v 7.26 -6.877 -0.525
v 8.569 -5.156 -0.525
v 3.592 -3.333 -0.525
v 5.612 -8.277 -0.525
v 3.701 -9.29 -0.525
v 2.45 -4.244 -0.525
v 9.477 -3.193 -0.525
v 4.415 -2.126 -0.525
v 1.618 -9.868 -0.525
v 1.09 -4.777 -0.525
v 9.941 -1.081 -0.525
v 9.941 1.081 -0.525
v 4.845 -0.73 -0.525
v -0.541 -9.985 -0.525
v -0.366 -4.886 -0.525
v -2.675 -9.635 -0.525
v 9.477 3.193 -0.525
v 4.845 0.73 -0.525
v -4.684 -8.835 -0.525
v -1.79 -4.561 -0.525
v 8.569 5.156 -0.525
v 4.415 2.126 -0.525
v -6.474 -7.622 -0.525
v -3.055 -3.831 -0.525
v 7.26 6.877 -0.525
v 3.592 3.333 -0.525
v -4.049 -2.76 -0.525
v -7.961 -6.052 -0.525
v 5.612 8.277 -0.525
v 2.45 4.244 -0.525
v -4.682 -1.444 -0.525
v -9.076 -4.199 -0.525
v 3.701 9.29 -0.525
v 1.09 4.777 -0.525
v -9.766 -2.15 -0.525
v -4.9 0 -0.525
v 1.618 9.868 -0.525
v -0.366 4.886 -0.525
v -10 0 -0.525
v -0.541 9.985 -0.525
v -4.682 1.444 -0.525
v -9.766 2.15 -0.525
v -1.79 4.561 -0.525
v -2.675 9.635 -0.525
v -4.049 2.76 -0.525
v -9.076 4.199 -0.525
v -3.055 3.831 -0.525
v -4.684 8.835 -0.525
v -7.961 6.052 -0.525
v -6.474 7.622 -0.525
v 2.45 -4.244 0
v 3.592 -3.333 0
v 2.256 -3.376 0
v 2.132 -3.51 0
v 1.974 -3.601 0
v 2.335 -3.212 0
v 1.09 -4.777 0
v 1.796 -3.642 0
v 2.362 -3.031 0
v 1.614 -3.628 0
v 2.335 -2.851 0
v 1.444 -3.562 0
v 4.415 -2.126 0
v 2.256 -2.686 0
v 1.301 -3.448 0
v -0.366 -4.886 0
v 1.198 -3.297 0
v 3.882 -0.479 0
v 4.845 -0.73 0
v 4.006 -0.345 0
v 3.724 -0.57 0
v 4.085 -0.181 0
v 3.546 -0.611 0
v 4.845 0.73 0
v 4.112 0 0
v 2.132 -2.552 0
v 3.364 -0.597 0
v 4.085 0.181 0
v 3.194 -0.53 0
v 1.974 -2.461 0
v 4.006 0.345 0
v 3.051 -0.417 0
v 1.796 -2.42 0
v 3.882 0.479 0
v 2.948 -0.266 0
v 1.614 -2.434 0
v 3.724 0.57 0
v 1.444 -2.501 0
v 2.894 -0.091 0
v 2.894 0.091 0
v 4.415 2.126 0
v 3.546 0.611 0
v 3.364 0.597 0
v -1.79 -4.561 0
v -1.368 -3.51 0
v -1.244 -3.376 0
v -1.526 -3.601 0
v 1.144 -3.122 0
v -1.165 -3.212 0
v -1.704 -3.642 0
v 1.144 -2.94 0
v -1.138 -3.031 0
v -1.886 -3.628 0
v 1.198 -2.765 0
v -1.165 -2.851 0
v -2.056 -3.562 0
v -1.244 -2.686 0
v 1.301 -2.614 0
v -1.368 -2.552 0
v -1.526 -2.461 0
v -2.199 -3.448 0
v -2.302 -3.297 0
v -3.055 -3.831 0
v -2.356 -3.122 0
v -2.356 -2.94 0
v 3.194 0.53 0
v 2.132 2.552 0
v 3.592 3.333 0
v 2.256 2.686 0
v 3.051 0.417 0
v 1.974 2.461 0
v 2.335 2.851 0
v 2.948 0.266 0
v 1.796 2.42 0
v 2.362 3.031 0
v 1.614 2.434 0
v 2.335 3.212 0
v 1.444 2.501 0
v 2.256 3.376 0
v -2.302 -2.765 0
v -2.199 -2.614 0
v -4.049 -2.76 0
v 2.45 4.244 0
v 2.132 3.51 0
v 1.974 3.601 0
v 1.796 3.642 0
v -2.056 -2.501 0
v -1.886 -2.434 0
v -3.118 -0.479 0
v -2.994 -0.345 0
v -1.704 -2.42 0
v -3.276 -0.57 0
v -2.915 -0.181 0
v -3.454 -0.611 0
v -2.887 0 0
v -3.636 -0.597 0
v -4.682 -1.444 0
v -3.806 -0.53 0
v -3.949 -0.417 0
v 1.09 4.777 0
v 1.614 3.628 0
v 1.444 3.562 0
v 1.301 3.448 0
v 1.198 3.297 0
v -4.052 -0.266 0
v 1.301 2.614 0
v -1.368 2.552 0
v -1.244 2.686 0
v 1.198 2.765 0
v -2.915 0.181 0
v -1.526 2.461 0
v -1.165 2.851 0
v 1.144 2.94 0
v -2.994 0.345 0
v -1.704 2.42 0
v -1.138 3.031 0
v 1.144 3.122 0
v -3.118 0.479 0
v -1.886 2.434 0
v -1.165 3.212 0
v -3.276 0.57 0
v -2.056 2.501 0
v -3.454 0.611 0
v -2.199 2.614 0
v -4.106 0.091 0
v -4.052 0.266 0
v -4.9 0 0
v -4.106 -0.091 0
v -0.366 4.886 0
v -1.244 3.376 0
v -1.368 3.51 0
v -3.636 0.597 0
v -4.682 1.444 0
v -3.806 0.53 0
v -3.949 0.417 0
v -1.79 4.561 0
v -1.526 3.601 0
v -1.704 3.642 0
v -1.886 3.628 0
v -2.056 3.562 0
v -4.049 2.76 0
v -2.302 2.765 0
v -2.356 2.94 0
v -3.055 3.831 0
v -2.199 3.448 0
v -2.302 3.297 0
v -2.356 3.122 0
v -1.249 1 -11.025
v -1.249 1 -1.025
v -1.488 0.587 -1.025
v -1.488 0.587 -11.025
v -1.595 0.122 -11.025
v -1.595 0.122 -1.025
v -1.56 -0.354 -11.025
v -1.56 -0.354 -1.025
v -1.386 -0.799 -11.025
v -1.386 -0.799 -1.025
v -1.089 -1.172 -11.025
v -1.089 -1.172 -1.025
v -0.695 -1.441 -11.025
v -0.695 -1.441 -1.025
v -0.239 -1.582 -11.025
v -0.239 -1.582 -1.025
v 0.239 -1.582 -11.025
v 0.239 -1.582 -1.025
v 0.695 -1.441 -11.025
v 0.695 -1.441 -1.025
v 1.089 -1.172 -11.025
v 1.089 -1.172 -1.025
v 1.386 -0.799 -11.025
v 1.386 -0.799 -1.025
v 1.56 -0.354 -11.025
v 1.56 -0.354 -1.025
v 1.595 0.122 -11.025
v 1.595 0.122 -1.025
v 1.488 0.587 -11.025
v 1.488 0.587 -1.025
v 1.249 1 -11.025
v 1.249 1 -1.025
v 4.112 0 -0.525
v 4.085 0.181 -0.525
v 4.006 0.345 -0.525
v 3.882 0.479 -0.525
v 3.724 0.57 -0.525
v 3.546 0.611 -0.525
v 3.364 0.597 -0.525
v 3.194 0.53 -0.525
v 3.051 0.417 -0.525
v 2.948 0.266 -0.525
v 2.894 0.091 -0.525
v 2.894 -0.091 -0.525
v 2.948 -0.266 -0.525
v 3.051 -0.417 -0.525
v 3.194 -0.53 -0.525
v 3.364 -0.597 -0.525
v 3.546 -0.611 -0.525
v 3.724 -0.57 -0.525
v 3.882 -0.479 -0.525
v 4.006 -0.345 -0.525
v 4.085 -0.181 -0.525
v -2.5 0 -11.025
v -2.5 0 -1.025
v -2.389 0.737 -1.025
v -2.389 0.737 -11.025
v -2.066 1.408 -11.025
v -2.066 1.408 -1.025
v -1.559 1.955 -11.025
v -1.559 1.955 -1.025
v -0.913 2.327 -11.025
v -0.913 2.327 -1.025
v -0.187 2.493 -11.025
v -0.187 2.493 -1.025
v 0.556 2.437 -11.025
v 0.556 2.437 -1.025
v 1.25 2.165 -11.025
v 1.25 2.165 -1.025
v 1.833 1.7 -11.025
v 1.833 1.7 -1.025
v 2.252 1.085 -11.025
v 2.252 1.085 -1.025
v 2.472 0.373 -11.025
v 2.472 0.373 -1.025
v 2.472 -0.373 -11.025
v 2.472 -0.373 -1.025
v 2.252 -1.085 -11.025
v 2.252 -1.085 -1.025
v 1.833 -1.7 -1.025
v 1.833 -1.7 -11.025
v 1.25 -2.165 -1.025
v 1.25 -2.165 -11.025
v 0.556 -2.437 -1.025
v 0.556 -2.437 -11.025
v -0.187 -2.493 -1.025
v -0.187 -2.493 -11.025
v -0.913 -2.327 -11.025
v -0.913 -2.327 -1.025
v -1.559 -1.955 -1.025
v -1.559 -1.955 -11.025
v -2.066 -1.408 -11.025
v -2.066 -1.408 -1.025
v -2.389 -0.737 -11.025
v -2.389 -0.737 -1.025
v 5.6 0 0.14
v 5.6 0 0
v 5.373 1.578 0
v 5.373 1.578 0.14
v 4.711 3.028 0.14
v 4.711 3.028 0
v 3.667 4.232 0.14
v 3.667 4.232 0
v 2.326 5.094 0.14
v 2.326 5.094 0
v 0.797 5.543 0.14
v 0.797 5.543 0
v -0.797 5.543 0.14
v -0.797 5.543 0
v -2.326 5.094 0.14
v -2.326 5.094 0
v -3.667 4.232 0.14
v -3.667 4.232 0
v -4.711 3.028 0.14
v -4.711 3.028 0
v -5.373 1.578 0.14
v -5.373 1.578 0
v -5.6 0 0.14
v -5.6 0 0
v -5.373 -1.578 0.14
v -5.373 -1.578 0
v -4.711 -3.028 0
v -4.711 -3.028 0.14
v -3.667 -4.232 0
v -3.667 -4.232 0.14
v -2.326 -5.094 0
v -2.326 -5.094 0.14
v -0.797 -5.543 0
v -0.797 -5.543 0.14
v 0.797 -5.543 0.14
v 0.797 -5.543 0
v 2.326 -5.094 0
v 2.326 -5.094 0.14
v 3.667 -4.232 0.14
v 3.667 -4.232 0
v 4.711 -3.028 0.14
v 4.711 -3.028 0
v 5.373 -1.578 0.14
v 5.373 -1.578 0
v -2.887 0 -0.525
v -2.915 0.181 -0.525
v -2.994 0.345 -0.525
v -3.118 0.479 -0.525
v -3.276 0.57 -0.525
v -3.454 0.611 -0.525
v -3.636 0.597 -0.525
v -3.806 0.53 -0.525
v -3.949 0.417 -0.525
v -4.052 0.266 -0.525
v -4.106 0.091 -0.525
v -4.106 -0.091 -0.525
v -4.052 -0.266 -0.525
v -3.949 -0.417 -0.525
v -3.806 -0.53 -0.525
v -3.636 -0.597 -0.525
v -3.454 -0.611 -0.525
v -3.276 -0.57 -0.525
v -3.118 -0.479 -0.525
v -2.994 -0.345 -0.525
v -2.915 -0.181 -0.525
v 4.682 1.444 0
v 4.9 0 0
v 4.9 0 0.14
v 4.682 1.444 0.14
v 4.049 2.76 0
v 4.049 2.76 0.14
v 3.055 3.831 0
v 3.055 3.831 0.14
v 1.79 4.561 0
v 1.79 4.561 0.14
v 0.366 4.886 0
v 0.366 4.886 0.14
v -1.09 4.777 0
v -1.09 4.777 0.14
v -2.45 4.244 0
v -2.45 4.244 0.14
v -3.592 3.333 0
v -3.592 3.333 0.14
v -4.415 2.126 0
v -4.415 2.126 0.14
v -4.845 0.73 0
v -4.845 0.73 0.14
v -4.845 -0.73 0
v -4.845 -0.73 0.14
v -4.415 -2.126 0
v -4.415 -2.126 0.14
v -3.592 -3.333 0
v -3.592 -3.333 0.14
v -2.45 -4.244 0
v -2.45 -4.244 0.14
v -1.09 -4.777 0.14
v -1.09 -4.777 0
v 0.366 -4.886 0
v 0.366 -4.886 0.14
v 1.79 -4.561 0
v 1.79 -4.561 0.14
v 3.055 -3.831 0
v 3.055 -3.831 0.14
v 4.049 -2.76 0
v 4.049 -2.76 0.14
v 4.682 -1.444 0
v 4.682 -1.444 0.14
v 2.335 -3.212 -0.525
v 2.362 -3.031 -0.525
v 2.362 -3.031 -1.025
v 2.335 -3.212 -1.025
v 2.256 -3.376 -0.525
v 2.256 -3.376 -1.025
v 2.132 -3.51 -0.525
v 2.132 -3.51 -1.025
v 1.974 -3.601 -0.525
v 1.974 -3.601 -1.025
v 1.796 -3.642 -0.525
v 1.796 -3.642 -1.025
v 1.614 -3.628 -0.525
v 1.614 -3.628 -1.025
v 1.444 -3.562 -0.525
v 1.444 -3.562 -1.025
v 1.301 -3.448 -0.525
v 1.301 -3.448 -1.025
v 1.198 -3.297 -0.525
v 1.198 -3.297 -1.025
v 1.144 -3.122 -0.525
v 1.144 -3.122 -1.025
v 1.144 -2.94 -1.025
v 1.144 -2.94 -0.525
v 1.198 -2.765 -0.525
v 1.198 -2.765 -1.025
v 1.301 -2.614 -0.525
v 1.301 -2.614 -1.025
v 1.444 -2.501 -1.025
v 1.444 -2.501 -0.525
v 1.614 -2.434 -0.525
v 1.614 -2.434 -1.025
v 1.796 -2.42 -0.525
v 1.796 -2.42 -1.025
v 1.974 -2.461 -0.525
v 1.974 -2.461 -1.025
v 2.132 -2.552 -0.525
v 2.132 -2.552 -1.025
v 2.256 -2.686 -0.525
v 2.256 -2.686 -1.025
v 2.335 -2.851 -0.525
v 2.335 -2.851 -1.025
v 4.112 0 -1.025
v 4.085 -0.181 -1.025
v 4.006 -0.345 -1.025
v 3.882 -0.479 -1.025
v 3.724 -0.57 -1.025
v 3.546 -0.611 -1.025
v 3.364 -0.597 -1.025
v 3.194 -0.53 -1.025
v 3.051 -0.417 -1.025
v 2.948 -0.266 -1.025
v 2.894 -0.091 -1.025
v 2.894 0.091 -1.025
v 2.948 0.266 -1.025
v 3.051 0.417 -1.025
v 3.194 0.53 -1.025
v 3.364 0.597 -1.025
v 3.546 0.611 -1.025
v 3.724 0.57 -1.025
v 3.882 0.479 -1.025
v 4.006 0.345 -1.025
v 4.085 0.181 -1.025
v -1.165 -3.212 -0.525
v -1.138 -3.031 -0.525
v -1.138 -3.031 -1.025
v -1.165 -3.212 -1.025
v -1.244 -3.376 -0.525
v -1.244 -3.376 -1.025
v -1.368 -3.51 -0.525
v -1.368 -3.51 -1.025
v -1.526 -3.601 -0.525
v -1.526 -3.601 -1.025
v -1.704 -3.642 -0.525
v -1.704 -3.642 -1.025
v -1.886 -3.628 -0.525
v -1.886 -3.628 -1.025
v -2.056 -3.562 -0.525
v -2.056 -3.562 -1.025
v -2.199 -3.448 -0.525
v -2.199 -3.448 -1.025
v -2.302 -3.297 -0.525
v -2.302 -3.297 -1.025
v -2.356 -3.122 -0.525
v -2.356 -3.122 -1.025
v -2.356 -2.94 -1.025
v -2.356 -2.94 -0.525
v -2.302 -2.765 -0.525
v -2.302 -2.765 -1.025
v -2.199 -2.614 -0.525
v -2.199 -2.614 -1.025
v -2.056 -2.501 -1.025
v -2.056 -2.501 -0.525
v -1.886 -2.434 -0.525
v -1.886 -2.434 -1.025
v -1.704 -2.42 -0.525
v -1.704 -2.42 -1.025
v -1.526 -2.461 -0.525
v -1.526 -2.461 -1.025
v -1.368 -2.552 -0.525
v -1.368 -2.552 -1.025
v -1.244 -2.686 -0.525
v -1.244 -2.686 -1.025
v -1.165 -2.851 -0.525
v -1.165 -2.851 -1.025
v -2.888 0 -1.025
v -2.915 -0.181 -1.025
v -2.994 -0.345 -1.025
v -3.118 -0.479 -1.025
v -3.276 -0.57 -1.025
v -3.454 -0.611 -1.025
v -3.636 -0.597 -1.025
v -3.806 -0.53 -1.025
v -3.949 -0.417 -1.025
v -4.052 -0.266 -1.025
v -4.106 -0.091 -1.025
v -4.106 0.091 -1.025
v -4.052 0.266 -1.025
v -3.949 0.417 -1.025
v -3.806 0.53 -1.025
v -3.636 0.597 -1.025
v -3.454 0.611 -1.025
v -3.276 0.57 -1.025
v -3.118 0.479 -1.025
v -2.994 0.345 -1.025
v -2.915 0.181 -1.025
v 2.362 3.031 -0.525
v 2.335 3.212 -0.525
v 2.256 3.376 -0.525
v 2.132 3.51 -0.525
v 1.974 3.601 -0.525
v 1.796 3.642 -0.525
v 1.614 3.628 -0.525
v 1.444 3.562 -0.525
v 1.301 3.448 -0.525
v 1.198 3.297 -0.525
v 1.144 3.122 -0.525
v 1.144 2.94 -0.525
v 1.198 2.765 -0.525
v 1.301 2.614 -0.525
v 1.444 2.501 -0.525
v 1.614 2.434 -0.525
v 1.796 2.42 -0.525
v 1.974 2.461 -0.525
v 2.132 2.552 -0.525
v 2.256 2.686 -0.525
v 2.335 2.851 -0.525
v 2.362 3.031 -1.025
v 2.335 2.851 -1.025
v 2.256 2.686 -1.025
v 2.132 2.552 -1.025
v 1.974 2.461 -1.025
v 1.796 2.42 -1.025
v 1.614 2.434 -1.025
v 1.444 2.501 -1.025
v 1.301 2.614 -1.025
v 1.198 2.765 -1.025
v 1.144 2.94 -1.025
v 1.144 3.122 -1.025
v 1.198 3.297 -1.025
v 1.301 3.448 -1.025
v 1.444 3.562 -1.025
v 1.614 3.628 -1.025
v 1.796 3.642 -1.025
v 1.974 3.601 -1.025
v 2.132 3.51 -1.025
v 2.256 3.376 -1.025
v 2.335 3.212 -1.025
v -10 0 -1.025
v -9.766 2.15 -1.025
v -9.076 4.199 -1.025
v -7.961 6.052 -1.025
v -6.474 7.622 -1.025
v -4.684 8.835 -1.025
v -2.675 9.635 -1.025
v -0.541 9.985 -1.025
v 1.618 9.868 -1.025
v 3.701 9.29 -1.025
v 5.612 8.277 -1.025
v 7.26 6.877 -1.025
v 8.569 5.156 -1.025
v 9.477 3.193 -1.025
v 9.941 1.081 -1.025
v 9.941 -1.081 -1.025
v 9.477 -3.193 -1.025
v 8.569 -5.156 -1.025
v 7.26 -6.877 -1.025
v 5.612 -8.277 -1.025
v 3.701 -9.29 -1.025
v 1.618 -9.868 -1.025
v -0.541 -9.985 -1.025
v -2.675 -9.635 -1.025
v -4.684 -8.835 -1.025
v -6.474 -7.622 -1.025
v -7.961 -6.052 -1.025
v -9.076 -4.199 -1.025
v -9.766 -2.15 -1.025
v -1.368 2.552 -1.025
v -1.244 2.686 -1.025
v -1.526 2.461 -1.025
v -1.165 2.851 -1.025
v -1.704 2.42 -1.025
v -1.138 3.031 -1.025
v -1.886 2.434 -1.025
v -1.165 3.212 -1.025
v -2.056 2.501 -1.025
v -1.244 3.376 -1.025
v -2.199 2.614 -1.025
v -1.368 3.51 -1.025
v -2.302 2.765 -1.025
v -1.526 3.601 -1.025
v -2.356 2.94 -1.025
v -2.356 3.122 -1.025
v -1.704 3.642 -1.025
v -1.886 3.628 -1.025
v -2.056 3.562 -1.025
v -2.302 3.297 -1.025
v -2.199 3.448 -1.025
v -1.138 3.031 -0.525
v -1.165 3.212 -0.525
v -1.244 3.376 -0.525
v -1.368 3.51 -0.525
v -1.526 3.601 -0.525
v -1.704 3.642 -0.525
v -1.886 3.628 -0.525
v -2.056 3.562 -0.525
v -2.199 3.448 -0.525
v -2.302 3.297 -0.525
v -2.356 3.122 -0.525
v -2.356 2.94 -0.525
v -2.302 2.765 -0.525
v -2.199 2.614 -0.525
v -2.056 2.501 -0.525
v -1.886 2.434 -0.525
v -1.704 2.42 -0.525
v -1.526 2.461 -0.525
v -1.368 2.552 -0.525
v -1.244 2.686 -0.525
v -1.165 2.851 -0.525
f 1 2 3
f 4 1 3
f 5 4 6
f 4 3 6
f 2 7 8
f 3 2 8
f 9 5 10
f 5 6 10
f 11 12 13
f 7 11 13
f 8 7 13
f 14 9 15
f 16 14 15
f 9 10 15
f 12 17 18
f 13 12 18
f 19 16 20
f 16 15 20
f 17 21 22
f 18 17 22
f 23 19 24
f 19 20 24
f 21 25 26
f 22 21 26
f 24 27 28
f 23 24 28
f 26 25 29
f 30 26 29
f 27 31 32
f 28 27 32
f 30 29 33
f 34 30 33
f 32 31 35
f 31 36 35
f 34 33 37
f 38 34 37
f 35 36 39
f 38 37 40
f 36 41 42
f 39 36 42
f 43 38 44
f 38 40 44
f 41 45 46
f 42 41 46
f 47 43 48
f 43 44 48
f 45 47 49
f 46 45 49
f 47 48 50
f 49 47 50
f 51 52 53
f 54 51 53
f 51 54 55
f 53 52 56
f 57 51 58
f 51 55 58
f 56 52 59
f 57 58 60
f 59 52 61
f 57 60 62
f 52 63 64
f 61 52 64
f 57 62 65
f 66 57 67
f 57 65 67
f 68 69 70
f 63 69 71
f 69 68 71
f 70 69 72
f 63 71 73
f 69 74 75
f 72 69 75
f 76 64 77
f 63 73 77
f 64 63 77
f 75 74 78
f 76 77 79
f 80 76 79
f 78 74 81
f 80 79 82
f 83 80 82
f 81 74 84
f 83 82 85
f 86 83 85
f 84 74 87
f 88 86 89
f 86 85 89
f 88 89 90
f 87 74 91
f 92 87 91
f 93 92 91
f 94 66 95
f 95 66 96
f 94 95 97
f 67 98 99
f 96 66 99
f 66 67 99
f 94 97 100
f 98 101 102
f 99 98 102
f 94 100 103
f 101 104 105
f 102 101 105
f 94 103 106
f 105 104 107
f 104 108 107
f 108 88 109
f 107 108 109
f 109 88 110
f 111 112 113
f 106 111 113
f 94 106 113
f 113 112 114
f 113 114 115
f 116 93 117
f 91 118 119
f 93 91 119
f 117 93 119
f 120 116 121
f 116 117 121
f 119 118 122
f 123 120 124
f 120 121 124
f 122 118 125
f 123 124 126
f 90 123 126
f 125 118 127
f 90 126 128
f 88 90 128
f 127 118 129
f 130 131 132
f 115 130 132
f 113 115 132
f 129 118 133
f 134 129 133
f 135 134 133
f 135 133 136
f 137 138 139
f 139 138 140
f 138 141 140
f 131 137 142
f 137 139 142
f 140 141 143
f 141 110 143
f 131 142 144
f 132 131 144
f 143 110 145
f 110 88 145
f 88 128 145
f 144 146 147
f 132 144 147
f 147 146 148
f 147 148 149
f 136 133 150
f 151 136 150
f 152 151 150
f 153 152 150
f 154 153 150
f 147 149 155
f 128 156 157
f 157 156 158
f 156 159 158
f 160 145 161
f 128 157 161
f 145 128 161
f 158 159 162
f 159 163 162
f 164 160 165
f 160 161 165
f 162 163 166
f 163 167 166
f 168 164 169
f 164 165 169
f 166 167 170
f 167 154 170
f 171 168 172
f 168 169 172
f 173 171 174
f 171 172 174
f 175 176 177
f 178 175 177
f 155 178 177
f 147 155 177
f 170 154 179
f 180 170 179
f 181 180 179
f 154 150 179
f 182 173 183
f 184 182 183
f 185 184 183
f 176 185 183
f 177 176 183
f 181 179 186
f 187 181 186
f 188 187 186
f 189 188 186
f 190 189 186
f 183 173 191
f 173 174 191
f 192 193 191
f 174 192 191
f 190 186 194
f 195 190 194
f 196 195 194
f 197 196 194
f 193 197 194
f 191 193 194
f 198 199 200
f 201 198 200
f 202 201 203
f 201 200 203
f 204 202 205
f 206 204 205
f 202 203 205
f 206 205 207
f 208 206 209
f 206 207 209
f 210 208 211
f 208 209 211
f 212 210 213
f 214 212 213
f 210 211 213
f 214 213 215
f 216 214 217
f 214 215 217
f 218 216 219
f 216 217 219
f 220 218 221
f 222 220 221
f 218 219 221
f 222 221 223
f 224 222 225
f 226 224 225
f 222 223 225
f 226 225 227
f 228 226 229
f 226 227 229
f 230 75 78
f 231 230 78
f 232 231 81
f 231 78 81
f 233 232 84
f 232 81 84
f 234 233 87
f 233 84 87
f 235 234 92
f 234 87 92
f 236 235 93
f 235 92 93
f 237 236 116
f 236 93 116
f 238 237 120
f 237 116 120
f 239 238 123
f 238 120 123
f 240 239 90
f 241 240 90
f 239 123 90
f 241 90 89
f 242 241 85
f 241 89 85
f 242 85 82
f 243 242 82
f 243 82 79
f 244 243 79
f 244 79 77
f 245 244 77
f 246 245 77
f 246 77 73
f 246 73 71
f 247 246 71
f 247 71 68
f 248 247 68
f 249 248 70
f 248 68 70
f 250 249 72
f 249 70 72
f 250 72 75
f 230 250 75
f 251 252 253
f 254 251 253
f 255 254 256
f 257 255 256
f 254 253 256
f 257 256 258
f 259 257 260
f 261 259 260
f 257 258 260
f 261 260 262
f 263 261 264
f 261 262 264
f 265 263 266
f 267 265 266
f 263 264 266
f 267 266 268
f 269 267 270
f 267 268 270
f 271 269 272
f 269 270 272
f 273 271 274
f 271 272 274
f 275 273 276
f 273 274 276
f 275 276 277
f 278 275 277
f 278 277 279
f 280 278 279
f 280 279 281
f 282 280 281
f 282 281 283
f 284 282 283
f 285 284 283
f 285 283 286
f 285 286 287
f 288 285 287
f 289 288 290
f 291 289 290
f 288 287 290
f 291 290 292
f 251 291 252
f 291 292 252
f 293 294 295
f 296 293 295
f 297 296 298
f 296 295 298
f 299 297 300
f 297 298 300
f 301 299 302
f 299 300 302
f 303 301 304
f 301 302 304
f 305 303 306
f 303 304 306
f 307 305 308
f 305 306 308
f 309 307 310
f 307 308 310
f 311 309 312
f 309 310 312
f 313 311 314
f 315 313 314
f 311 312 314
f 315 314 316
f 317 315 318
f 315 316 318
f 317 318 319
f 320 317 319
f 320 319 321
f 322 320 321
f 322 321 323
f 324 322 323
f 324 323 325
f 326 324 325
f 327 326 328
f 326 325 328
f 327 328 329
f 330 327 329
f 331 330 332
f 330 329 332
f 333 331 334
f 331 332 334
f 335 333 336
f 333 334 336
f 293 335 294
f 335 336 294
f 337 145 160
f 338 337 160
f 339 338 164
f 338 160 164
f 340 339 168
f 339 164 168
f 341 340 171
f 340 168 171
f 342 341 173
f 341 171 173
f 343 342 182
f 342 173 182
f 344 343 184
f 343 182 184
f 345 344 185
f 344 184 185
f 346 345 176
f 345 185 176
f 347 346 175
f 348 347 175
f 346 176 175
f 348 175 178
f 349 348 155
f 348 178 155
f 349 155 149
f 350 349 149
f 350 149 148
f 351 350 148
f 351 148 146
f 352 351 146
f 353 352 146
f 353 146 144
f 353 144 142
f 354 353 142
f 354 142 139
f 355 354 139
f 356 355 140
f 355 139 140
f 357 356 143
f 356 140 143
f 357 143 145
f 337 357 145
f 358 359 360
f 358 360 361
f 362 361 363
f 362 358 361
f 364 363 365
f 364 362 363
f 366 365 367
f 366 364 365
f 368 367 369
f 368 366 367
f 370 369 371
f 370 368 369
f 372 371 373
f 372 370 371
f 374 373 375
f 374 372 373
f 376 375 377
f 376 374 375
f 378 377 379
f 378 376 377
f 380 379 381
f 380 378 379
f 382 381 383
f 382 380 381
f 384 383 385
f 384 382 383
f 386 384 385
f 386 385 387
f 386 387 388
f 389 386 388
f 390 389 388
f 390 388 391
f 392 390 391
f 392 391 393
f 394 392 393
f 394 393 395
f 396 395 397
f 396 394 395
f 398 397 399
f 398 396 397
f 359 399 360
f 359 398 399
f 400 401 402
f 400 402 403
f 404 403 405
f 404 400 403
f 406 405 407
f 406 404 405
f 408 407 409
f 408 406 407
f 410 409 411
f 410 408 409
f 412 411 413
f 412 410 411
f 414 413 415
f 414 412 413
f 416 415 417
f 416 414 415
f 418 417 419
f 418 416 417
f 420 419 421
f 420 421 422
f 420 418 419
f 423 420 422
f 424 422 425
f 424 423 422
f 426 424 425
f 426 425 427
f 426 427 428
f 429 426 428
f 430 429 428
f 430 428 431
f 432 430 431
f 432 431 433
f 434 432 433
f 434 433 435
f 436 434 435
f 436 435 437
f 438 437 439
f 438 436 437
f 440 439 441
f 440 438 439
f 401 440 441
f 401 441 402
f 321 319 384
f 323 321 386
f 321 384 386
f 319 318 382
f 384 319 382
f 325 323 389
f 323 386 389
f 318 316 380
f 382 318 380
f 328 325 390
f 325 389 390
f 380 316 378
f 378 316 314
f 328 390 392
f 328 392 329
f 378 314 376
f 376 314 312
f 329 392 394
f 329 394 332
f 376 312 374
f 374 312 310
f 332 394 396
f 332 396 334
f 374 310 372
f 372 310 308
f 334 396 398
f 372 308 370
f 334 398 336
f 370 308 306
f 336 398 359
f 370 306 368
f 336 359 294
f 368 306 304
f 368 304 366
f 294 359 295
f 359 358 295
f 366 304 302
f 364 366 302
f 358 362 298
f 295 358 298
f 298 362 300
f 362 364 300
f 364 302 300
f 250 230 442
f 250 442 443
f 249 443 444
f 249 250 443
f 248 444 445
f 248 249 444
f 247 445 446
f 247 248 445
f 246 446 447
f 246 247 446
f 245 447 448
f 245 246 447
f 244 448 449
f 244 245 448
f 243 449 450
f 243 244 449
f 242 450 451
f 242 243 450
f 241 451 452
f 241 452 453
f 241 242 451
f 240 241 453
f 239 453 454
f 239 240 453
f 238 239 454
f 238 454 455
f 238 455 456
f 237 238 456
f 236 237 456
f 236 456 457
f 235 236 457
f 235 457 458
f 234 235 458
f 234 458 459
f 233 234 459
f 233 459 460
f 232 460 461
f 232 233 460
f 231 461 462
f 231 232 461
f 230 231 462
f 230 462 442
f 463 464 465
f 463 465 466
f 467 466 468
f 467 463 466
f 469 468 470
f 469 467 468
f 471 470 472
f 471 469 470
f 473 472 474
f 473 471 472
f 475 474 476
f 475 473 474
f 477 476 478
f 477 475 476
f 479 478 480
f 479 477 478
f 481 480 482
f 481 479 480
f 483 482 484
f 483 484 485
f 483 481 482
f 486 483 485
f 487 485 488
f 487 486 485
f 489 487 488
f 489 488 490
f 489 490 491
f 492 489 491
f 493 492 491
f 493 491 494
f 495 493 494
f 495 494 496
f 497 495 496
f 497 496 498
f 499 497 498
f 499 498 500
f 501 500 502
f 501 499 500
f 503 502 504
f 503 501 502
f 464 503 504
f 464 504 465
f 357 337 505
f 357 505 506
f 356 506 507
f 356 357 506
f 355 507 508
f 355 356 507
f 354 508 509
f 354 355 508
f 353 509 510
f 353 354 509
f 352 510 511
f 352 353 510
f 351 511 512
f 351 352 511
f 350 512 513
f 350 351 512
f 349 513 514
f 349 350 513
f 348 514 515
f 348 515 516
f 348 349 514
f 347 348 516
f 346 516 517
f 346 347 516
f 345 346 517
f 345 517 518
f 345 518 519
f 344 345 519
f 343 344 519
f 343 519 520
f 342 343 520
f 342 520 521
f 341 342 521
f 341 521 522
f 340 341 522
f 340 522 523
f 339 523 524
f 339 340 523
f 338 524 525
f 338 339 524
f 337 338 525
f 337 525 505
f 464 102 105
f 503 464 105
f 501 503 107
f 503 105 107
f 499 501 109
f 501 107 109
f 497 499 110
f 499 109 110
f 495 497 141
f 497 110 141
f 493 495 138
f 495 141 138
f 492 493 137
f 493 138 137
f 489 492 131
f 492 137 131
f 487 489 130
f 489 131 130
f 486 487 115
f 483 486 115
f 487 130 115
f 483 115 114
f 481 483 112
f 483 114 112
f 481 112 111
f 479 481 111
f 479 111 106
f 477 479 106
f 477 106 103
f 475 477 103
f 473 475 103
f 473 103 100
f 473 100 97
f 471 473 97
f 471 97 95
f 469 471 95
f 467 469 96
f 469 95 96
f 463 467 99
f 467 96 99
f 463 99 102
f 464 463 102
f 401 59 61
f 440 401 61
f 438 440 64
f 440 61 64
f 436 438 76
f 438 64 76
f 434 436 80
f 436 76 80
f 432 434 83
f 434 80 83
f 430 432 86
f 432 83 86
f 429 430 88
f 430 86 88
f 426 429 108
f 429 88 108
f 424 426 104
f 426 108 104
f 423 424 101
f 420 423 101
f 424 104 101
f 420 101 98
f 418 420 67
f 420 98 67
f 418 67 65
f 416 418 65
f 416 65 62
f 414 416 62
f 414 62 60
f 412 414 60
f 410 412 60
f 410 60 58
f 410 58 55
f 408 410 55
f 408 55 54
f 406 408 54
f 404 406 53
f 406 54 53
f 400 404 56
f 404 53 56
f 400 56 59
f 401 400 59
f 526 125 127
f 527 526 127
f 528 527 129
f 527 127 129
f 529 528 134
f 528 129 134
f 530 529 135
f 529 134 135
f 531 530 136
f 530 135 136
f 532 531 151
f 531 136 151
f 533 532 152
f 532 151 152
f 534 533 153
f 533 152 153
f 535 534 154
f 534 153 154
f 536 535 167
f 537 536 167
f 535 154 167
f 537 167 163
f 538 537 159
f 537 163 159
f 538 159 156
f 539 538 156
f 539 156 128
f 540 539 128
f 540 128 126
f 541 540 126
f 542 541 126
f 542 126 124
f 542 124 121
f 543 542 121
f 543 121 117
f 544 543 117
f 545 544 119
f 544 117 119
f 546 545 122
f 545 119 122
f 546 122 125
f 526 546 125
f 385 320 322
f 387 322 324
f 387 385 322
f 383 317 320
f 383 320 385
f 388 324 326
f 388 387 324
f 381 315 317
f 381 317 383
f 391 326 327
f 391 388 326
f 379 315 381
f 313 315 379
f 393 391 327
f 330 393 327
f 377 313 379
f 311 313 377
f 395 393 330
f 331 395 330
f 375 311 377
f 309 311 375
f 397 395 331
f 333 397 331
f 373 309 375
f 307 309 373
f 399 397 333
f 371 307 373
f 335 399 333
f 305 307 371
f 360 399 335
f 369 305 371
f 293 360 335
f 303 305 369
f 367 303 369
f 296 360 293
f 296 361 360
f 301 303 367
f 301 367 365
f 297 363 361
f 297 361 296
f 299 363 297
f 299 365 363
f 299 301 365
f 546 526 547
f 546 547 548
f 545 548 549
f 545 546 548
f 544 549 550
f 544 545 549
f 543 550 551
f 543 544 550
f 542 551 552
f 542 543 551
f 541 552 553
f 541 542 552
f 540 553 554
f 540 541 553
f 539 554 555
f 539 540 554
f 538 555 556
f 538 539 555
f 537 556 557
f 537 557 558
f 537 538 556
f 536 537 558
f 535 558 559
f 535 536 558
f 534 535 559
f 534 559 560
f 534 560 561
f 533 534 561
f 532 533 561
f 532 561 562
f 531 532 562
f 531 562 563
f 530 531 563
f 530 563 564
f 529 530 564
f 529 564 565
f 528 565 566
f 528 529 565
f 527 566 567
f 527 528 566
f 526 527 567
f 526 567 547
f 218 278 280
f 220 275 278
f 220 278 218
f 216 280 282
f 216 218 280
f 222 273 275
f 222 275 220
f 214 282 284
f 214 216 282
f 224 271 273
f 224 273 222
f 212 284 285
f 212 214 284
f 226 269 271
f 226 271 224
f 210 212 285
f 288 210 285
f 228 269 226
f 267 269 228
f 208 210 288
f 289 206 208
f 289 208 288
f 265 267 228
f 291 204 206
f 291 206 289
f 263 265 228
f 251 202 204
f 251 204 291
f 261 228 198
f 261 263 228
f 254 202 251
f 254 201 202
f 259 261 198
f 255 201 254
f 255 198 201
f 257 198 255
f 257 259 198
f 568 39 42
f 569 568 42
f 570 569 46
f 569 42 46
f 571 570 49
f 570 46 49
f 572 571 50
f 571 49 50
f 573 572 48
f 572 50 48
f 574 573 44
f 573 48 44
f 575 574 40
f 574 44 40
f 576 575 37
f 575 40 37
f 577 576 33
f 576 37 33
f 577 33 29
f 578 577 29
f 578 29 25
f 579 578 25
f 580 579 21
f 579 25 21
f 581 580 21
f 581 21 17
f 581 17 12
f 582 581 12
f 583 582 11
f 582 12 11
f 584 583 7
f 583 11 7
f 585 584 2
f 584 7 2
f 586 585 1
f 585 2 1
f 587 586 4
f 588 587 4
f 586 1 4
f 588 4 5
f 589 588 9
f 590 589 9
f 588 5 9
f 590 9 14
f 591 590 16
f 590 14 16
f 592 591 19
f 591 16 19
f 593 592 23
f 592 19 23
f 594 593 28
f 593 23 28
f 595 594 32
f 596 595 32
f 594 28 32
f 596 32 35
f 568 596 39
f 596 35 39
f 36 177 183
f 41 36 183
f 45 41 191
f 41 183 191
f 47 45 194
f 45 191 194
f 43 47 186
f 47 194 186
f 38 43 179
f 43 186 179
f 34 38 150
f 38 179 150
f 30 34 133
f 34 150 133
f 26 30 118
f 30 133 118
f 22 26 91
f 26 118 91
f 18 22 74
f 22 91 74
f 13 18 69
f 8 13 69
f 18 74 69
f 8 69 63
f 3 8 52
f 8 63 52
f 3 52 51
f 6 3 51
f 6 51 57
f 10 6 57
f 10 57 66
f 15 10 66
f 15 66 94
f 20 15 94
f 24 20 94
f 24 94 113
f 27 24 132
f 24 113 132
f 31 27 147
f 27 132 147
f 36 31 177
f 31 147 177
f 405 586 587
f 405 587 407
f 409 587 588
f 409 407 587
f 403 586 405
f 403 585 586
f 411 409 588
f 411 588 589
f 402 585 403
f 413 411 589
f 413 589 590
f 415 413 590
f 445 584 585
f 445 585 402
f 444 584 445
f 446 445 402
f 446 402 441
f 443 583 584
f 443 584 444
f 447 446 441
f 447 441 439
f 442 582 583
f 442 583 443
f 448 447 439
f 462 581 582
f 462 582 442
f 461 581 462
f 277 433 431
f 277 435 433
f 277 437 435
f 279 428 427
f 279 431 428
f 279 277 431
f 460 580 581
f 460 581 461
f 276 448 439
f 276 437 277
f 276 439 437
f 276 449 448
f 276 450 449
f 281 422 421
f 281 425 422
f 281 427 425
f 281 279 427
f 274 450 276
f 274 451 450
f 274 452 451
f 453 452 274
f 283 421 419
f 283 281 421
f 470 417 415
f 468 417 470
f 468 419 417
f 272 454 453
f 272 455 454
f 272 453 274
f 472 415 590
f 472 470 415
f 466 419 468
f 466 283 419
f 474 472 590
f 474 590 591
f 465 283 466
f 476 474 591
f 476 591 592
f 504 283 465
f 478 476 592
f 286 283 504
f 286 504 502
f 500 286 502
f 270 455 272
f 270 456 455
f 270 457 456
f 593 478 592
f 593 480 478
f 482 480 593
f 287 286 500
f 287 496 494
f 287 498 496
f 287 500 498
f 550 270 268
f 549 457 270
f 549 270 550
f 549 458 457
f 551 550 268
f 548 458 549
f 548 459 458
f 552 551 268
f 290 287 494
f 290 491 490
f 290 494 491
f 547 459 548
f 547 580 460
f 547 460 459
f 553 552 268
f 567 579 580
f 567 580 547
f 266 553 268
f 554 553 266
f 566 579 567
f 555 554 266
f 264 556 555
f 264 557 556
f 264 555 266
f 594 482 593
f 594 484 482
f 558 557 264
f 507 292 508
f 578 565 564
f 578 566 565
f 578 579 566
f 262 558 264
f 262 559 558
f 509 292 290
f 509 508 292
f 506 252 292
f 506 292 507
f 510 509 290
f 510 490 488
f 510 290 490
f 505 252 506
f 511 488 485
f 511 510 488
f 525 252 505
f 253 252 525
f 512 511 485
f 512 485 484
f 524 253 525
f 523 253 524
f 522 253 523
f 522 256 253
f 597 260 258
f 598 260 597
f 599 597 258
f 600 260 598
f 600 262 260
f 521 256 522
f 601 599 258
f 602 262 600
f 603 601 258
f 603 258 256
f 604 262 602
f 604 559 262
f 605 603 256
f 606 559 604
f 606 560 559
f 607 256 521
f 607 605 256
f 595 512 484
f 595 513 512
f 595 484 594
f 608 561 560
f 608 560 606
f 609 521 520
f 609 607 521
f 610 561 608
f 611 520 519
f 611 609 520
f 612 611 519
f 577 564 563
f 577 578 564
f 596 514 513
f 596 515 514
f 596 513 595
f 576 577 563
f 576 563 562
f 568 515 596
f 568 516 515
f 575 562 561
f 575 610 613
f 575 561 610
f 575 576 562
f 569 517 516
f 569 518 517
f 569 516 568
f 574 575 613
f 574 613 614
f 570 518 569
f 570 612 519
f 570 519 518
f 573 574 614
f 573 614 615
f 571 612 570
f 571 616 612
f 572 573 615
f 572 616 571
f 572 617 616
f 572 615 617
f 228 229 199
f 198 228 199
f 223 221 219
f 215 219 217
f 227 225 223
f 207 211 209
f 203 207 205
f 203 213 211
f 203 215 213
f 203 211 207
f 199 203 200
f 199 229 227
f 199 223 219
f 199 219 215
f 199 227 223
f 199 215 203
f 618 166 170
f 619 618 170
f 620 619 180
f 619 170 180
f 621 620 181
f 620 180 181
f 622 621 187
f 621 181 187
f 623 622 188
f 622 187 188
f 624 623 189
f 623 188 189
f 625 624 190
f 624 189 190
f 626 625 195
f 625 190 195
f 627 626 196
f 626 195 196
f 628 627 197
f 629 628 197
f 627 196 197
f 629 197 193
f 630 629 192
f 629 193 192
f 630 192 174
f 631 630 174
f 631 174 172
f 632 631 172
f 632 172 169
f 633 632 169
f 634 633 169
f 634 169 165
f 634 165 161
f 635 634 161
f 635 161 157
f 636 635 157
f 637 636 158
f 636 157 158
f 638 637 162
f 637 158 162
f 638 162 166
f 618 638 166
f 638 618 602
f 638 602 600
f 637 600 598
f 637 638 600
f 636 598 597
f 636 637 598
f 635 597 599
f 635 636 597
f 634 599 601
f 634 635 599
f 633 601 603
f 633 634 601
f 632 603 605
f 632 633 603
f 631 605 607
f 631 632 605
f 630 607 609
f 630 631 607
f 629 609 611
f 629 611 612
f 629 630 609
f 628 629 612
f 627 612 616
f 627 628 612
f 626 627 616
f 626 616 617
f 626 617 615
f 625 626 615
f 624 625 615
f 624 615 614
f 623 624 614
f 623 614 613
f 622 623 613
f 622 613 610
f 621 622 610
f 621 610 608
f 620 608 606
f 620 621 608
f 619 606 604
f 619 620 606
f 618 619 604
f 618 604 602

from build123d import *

# Parameters (mm, degrees)
SKETCH_1_R          = 16
SKETCH_1_R_2        = 14
EXTRUDE_1_DEPTH     = 0.4
SKETCH_2_R          = 14
EXTRUDE_1_2_DEPTH   = 1.5
SKETCH_3_R          = 1.75
CUT_EXTRUDE_1_DEPTH = 1.5
SCALE_1_SCALE       = 0.35
SKETCH_4_R          = 10
SKETCH_4_R_2        = 0.6125
EXTRUDE_2_DEPTH     = 0.5
SKETCH_5_R          = 2.5
EXTRUDE_3_DEPTH     = 10


with BuildPart() as part:
    # 草图1 → Extrude 1 (new body)
    with BuildSketch(Plane.XY):
        Circle(SKETCH_1_R)
        Circle(SKETCH_1_R_2, mode=Mode.SUBTRACT)
    extrude(amount=EXTRUDE_1_DEPTH)


with BuildPart() as body_2:
    # 草图2 → Extrude 1 2 (new body)
    with BuildSketch(Plane(origin=(0, 0, 0), x_dir=(-1, 0, 0), z_dir=(0, 0, -1))):
        Circle(SKETCH_2_R)
    extrude(amount=EXTRUDE_1_2_DEPTH)

    # 草图3 → 切除-拉伸1 (cut)
    with BuildSketch(Plane.XY):
        with Locations((10, 0)):
            Circle(SKETCH_3_R)
        with Locations((5, -8.660254038)):
            Circle(SKETCH_3_R)
        with Locations((-5, -8.660254038)):
            Circle(SKETCH_3_R)
        with Locations((-10, 0)):
            Circle(SKETCH_3_R)
        with Locations((-5, 8.660254038)):
            Circle(SKETCH_3_R)
        with Locations((5, 8.660254038)):
            Circle(SKETCH_3_R)
    extrude(amount=-CUT_EXTRUDE_1_DEPTH, mode=Mode.SUBTRACT)


with BuildPart() as part_1:
    # 缩放比例1: scaled about (0, 0, 0)
    add(part.part.scale(SCALE_1_SCALE))


with BuildPart() as body_2_1:
    # 缩放比例1: scaled about (0, 0, 0)
    add(body_2.part.scale(SCALE_1_SCALE))

    # 草图4 → 凸台-拉伸2 (add)
    with BuildSketch(Plane(origin=(0, 0, -0.525), x_dir=(-1, 0, 0), z_dir=(0, 0, -1))):
        Circle(SKETCH_4_R)
        with Locations(Location((1.75, -3.031088913, 0), (0, 0, 180))):
            Circle(SKETCH_4_R_2, mode=Mode.SUBTRACT)
        with Locations(Location((-1.75, -3.031088913, 0), (0, 0, 180))):
            Circle(SKETCH_4_R_2, mode=Mode.SUBTRACT)
        with Locations(Location((-3.5, 0, 0), (0, 0, 180))):
            Circle(SKETCH_4_R_2, mode=Mode.SUBTRACT)
        with Locations(Location((-1.75, 3.031088913, 0), (0, 0, 180))):
            Circle(SKETCH_4_R_2, mode=Mode.SUBTRACT)
        with Locations(Location((1.75, 3.031088913, 0), (0, 0, 180))):
            Circle(SKETCH_4_R_2, mode=Mode.SUBTRACT)
        with Locations(Location((3.5, 0, 0), (0, 0, 180))):
            Circle(SKETCH_4_R_2, mode=Mode.SUBTRACT)
    extrude(amount=EXTRUDE_2_DEPTH)

    # 草图5 → 凸台-拉伸3 (add)
    with BuildSketch(Plane(origin=(0, 0, -1.025), x_dir=(-1, 0, 0), z_dir=(0, 0, -1))):
        Circle(SKETCH_5_R)
        with BuildLine():
            Line((-1.2489996, 1), (1.2489996, 1))
            ThreePointArc((1.2489996, 1), (0, -1.6), (-1.2489996, 1))
        make_face(mode=Mode.SUBTRACT)
    extrude(amount=EXTRUDE_3_DEPTH)


solid = Compound([part_1.part, body_2_1.part])
